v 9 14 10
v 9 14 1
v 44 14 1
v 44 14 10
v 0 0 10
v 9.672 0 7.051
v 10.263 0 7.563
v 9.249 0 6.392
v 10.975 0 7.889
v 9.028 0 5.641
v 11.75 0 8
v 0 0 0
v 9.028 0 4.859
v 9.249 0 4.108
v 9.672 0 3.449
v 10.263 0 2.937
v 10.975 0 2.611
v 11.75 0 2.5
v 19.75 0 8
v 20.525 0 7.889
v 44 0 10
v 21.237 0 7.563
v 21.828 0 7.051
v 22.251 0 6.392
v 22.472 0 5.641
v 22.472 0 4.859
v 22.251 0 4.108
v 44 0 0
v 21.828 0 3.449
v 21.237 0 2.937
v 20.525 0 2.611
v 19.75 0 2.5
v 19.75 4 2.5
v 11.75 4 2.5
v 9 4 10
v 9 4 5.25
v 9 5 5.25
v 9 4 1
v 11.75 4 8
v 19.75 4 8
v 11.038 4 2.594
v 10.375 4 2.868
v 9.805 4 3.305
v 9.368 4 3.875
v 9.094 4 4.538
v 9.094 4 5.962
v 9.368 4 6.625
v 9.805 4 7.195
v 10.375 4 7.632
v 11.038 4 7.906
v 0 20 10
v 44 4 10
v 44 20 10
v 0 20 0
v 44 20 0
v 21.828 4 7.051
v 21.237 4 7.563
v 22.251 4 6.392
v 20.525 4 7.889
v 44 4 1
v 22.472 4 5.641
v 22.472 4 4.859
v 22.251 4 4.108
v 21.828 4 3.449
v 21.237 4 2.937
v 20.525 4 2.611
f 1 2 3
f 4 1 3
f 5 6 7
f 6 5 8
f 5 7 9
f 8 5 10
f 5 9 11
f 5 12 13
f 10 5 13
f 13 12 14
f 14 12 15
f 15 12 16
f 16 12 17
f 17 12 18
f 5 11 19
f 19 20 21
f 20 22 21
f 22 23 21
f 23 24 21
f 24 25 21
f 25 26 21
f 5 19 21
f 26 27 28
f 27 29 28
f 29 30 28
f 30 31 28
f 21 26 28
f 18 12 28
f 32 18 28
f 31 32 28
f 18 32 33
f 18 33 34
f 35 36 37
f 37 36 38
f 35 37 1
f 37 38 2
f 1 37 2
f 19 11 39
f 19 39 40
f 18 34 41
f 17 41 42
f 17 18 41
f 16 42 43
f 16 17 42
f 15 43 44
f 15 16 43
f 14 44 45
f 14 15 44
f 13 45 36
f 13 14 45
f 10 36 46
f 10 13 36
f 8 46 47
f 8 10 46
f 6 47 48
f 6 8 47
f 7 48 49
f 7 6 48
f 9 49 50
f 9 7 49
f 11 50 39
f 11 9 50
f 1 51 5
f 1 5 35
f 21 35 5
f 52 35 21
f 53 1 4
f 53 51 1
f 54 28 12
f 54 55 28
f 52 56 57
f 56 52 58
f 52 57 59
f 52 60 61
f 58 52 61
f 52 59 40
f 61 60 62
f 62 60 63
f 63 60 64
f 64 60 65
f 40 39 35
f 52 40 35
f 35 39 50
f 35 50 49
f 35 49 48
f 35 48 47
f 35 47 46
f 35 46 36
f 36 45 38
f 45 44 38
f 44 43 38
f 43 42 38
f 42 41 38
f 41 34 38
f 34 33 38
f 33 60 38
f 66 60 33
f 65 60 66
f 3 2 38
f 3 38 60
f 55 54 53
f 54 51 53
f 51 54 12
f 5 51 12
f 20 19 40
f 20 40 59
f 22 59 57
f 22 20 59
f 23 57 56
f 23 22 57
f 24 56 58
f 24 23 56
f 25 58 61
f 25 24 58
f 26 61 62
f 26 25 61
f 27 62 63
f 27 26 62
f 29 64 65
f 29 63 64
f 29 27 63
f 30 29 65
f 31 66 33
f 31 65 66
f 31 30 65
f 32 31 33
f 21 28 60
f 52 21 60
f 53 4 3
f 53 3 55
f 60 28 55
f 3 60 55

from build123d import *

# Parameters (mm, degrees)
RESSALTO_EXTRUS_O1_DEPTH   = 5
CORTE_EXTRUS_O1_DEPTH      = 83.83115356
CORTE_EXTRUS_O1_DEPTH_BACK = 4
ESBO_O5_W                  = 35
ESBO_O5_H                  = 10
RESSALTO_EXTRUS_O2_DEPTH   = 5
FILETE1_R                  = 5
CORTE_EXTRUS_O2_DEPTH      = 83.83115356
CORTE_EXTRUS_O3_DEPTH      = 5
FILETE2_R                  = 2
ESBO_O10_W                 = 20
ESBO_O10_H                 = 50
CORTE_EXTRUS_O4_DEPTH      = 84.282651255


with BuildPart() as part:
    # Esboço1 → Ressalto-extrusão1 (new body)
    with BuildSketch(Plane.XY):
        Polygon((0, 0), (0, 70), (20, 70), (20, 20), (44, 20), (44, 0), align=None)
    extrude(amount=RESSALTO_EXTRUS_O1_DEPTH)

    # Esboço5 → Corte-extrusão1 (cut, two sides: drawn at the far end of the back side and taken through both)
    with BuildSketch(Plane.XY.offset(5).offset(-CORTE_EXTRUS_O1_DEPTH_BACK)):
        with Locations((26.5, 9)):
            Rectangle(ESBO_O5_W, ESBO_O5_H)
    extrude(amount=CORTE_EXTRUS_O1_DEPTH + CORTE_EXTRUS_O1_DEPTH_BACK, mode=Mode.SUBTRACT)

    # Esboço6 → Ressalto-extrusão2 (add)
    with BuildSketch(Plane.XY.offset(5)):
        Polygon((44, 20), (0, 20), (0, 0), (44, 0), (44, 4), (9, 4), (9, 14), (44, 14), align=None)
    extrude(amount=RESSALTO_EXTRUS_O2_DEPTH)

    # Filete1
    filete1_edges = [part.edges().sort_by_distance(p)[0] for p in [
        (10, 20, 5),
    ]]
    fillet(filete1_edges, radius=FILETE1_R - 0.0001)  # a hair under: the kernel refuses the full size

    # Esboço7 → Corte-extrusão2 (cut, through all)
    with BuildSketch(Plane.XY.offset(5)):
        with BuildLine():
            Line((12.75, 65), (12.75, 55))
            ThreePointArc((12.75, 55), (10, 52.25), (7.25, 55))
            Line((7.25, 55), (7.25, 65))
            ThreePointArc((7.25, 65), (10, 67.75), (12.75, 65))
        make_face()
    extrude(amount=-CORTE_EXTRUS_O2_DEPTH, mode=Mode.SUBTRACT)

    # Esboço8 → Corte-extrusão3 (cut)
    with BuildSketch(Plane.XZ):
        with BuildLine():
            Line((11.75, 8), (19.75, 8))
            ThreePointArc((19.75, 8), (22.5, 5.25), (19.75, 2.5))
            Line((19.75, 2.5), (11.75, 2.5))
            ThreePointArc((11.75, 2.5), (9, 5.25), (11.75, 8))
        make_face()
    extrude(amount=-CORTE_EXTRUS_O3_DEPTH, mode=Mode.SUBTRACT)

    # Filete2
    filete2_edges = [part.edges().sort_by_distance(p)[0] for p in [
        (0, 70, 2.5),
        (20, 70, 2.5),
    ]]
    fillet(filete2_edges, radius=FILETE2_R)

    # Esboço10 → Corte-extrusão4 (cut, through all)
    with BuildSketch(Plane.XY.offset(10)):
        with Locations((10, 45)):
            Rectangle(ESBO_O10_W, ESBO_O10_H)
    extrude(amount=-CORTE_EXTRUS_O4_DEPTH, mode=Mode.SUBTRACT)


solid = part.part
